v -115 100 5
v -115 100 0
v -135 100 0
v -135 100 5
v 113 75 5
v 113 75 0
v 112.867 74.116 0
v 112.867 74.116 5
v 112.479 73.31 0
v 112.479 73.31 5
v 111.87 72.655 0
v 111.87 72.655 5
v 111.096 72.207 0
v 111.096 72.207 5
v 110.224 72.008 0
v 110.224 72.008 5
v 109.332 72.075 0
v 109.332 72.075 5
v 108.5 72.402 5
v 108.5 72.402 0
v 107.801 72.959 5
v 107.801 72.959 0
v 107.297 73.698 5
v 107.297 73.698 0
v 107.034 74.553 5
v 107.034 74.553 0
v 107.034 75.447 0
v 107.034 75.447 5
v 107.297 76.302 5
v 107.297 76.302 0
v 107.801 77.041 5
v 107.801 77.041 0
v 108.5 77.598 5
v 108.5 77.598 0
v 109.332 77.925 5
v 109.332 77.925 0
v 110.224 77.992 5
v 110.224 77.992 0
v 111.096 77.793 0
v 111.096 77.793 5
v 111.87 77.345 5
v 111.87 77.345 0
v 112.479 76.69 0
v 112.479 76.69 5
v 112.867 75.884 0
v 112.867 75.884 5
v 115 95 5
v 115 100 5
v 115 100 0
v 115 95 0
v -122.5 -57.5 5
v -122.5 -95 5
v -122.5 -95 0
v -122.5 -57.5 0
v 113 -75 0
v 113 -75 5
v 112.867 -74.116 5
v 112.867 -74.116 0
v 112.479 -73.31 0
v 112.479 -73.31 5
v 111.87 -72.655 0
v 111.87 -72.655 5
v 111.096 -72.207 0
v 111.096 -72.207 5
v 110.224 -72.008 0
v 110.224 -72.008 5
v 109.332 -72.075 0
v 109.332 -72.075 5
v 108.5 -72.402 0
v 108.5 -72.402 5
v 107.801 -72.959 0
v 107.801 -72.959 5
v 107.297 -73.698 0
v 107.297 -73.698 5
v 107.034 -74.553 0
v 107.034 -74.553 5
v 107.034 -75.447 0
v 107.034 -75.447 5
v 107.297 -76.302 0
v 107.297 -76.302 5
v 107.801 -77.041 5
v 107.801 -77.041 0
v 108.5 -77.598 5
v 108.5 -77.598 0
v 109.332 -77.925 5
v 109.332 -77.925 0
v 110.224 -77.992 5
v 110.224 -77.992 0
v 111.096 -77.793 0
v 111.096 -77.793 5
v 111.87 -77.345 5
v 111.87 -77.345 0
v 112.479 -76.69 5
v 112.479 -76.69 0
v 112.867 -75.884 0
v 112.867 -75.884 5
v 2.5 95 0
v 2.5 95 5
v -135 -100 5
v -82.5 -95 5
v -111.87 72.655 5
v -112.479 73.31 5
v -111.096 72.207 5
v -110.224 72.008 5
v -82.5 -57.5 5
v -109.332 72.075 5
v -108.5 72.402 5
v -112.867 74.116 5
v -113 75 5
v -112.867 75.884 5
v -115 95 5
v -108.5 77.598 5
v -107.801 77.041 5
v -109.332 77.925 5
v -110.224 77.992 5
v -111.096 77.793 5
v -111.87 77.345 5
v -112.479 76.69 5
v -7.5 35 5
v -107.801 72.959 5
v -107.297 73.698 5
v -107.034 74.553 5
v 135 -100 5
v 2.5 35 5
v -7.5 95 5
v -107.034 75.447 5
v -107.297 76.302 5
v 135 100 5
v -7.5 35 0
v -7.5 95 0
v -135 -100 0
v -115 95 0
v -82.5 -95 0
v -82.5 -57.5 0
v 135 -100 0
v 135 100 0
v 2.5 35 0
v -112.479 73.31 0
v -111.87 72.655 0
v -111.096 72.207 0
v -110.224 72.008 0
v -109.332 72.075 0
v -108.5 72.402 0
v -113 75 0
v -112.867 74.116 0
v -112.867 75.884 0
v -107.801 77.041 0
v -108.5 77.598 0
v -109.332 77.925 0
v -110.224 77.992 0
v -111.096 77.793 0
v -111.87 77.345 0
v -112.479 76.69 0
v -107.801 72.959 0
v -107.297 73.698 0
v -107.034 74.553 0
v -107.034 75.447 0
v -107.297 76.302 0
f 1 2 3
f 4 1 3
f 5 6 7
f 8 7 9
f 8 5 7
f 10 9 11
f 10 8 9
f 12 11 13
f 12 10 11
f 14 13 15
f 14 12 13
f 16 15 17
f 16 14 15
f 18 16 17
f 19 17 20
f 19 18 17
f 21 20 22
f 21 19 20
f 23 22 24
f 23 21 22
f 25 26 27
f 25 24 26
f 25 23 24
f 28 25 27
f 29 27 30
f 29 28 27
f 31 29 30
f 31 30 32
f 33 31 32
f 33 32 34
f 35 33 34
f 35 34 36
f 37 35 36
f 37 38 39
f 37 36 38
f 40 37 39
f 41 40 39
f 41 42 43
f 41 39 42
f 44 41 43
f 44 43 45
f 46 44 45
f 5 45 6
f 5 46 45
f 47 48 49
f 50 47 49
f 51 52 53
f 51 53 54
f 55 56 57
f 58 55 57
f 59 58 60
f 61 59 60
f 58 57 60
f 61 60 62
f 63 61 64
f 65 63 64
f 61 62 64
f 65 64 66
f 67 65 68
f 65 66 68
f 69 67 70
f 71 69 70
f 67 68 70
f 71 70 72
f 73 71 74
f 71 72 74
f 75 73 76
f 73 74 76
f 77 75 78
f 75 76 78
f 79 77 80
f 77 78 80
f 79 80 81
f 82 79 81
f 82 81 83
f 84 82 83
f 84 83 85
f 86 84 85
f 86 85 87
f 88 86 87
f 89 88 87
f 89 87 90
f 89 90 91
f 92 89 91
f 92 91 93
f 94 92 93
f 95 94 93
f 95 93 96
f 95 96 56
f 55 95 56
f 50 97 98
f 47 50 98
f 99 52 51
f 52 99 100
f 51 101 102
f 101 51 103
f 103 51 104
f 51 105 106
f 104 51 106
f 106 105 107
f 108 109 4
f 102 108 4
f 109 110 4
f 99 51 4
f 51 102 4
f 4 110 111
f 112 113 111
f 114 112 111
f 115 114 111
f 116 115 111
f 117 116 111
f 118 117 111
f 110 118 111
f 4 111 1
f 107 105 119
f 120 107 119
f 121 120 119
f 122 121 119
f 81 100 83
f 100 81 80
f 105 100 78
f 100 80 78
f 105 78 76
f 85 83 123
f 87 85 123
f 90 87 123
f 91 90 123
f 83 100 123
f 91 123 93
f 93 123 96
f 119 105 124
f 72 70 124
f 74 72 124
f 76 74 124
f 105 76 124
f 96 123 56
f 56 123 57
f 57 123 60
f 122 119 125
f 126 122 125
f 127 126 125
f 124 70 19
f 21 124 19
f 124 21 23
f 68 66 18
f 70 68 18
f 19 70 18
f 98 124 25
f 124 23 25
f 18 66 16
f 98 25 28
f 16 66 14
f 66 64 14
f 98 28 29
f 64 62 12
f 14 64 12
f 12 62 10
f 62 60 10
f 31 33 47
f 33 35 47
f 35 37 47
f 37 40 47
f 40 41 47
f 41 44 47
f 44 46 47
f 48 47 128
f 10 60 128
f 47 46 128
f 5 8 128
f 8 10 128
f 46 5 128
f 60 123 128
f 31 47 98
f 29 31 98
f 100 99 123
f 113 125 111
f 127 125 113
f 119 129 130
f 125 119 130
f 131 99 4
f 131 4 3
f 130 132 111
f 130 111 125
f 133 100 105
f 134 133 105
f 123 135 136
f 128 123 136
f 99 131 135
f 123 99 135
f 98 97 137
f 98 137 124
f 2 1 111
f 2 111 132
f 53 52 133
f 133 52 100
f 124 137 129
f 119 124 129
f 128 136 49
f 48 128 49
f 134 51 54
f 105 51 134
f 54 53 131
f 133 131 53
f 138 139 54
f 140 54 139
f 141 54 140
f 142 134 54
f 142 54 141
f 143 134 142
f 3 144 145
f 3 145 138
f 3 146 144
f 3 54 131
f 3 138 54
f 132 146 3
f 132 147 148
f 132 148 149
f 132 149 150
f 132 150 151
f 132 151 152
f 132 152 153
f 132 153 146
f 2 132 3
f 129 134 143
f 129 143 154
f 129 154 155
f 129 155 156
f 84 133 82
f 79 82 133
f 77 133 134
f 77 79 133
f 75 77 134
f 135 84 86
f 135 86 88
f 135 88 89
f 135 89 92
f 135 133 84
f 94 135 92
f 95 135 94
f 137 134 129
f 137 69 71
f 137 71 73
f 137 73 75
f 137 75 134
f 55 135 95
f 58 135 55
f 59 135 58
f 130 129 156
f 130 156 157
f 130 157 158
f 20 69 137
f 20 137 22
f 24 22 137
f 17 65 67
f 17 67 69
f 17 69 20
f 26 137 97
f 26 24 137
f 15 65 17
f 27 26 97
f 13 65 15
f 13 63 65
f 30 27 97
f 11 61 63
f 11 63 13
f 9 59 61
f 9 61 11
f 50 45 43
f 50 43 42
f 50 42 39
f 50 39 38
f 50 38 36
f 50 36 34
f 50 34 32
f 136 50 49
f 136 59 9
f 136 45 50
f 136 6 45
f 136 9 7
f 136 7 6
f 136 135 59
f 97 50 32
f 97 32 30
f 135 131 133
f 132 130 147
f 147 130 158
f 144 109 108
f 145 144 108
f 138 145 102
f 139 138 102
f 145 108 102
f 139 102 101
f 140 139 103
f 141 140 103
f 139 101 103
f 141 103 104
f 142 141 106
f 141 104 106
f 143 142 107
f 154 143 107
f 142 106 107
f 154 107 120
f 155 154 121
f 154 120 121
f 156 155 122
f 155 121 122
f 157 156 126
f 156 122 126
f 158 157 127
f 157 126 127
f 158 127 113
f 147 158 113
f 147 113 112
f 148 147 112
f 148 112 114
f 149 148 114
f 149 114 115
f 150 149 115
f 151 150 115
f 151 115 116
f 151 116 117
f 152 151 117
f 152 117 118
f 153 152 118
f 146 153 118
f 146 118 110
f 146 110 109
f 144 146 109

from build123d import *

# Parameters (mm, degrees)
BOSS_EXTRU_2_DEPTH        = 5
ESQUISSE2_R               = 3
ENL_V_MAT_EXTRU_1_DEPTH   = 169.07736314
SYM_TRIE2_COPY_1_SKETCH_R = 3
SYM_TRIE2_COPY_1_DEPTH    = 169.07736314
ESQUISSE4_W               = 40
ESQUISSE4_H               = 37.5
ENL_V_MAT_EXTRU_2_DEPTH   = 60
ESQUISSE5_W               = 45
ESQUISSE5_H               = 5
BOSS_EXTRU_3_DEPTH        = 60
ESQUISSE7_W               = 230
ESQUISSE7_H               = 5
ENL_V_MAT_EXTRU_3_DEPTH   = 5
ESQUISSE11_W              = 15
ESQUISSE11_H              = 60
ENL_V_MAT_EXTRU_4_DEPTH   = 10
ESQUISSE12_W              = 5
ESQUISSE12_H              = 60
BOSS_EXTRU_4_DEPTH        = 5


with BuildPart() as part:
    # Esquisse1 → Boss.-Extru.2 (new body)
    with BuildSketch(Plane.XY):
        Polygon((135, 100), (-135, 100), (-135, 22.5), (-90, 22.5), (-90, -22.5), (-135, -22.5), (-135, -100), (135, -100), align=None)
    extrude(amount=BOSS_EXTRU_2_DEPTH)

    # Esquisse2 → Enlèv. mat.-Extru.1 (cut, through all)
    with BuildSketch(Plane.XY.offset(5)):
        with Locations((110, -75)):
            Circle(ESQUISSE2_R)
    enl_v_mat_extru_1 = extrude(amount=-ENL_V_MAT_EXTRU_1_DEPTH, mode=Mode.SUBTRACT)

    # Symétrie1: Enlèv. mat.-Extru.1 across plane
    add(enl_v_mat_extru_1.mirror(Plane(origin=(0, 0, 0), x_dir=(0, 0, 1), z_dir=(1, 0, 0))), mode=Mode.SUBTRACT)

    # Symétrie2: Enlèv. mat.-Extru.1 across plane
    add(enl_v_mat_extru_1.mirror(Plane(origin=(0, 0, 0), x_dir=(0, 0, 1), z_dir=(0, -1, 0))), mode=Mode.SUBTRACT)

    # Symétrie2 copy 1 sketch → Symétrie2 copy 1 (cut, through all)
    with BuildSketch(Plane(origin=(0, 0, 5), x_dir=(-1, 0, 0), z_dir=(0, 0, 1))):
        with Locations((110, -75)):
            Circle(SYM_TRIE2_COPY_1_SKETCH_R)
    extrude(amount=-SYM_TRIE2_COPY_1_DEPTH, mode=Mode.SUBTRACT)

    # Esquisse4 → Enlèv. mat.-Extru.2 (cut)
    with BuildSketch(Plane.XY.offset(5)):
        with Locations((-102.5, -76.25)):
            Rectangle(ESQUISSE4_W, ESQUISSE4_H)
    extrude(amount=-ENL_V_MAT_EXTRU_2_DEPTH, mode=Mode.SUBTRACT)

    # Esquisse5 → Boss.-Extru.3 (add)
    with BuildSketch(Plane(origin=(0, -22.5, 0), x_dir=(1, 0, 0), z_dir=(0, 1, 0))):
        with Locations((-112.5, -2.5)):
            Rectangle(ESQUISSE5_W, ESQUISSE5_H)
    extrude(amount=BOSS_EXTRU_3_DEPTH)

    # Esquisse7 → Enlèv. mat.-Extru.3 (cut)
    with BuildSketch(Plane(origin=(0, 100, 0), x_dir=(1, 0, 0), z_dir=(0, 1, 0))):
        with Locations((0, -2.5)):
            Rectangle(ESQUISSE7_W, ESQUISSE7_H)
    extrude(amount=-ENL_V_MAT_EXTRU_3_DEPTH, mode=Mode.SUBTRACT)

    # Esquisse11 → Enlèv. mat.-Extru.4 (cut)
    with BuildSketch(Plane(origin=(0, 0, 0), x_dir=(-1, 0, 0), z_dir=(0, 0, -1))):
        with Locations((0, 65)):
            Rectangle(ESQUISSE11_W, ESQUISSE11_H)
    extrude(amount=-ENL_V_MAT_EXTRU_4_DEPTH, mode=Mode.SUBTRACT)

    # Esquisse12 → Boss.-Extru.4 (add)
    with BuildSketch(Plane.ZY.offset(-7.5)):
        with Locations((2.5, 65)):
            Rectangle(ESQUISSE12_W, ESQUISSE12_H)
    extrude(amount=BOSS_EXTRU_4_DEPTH)


solid = part.part
